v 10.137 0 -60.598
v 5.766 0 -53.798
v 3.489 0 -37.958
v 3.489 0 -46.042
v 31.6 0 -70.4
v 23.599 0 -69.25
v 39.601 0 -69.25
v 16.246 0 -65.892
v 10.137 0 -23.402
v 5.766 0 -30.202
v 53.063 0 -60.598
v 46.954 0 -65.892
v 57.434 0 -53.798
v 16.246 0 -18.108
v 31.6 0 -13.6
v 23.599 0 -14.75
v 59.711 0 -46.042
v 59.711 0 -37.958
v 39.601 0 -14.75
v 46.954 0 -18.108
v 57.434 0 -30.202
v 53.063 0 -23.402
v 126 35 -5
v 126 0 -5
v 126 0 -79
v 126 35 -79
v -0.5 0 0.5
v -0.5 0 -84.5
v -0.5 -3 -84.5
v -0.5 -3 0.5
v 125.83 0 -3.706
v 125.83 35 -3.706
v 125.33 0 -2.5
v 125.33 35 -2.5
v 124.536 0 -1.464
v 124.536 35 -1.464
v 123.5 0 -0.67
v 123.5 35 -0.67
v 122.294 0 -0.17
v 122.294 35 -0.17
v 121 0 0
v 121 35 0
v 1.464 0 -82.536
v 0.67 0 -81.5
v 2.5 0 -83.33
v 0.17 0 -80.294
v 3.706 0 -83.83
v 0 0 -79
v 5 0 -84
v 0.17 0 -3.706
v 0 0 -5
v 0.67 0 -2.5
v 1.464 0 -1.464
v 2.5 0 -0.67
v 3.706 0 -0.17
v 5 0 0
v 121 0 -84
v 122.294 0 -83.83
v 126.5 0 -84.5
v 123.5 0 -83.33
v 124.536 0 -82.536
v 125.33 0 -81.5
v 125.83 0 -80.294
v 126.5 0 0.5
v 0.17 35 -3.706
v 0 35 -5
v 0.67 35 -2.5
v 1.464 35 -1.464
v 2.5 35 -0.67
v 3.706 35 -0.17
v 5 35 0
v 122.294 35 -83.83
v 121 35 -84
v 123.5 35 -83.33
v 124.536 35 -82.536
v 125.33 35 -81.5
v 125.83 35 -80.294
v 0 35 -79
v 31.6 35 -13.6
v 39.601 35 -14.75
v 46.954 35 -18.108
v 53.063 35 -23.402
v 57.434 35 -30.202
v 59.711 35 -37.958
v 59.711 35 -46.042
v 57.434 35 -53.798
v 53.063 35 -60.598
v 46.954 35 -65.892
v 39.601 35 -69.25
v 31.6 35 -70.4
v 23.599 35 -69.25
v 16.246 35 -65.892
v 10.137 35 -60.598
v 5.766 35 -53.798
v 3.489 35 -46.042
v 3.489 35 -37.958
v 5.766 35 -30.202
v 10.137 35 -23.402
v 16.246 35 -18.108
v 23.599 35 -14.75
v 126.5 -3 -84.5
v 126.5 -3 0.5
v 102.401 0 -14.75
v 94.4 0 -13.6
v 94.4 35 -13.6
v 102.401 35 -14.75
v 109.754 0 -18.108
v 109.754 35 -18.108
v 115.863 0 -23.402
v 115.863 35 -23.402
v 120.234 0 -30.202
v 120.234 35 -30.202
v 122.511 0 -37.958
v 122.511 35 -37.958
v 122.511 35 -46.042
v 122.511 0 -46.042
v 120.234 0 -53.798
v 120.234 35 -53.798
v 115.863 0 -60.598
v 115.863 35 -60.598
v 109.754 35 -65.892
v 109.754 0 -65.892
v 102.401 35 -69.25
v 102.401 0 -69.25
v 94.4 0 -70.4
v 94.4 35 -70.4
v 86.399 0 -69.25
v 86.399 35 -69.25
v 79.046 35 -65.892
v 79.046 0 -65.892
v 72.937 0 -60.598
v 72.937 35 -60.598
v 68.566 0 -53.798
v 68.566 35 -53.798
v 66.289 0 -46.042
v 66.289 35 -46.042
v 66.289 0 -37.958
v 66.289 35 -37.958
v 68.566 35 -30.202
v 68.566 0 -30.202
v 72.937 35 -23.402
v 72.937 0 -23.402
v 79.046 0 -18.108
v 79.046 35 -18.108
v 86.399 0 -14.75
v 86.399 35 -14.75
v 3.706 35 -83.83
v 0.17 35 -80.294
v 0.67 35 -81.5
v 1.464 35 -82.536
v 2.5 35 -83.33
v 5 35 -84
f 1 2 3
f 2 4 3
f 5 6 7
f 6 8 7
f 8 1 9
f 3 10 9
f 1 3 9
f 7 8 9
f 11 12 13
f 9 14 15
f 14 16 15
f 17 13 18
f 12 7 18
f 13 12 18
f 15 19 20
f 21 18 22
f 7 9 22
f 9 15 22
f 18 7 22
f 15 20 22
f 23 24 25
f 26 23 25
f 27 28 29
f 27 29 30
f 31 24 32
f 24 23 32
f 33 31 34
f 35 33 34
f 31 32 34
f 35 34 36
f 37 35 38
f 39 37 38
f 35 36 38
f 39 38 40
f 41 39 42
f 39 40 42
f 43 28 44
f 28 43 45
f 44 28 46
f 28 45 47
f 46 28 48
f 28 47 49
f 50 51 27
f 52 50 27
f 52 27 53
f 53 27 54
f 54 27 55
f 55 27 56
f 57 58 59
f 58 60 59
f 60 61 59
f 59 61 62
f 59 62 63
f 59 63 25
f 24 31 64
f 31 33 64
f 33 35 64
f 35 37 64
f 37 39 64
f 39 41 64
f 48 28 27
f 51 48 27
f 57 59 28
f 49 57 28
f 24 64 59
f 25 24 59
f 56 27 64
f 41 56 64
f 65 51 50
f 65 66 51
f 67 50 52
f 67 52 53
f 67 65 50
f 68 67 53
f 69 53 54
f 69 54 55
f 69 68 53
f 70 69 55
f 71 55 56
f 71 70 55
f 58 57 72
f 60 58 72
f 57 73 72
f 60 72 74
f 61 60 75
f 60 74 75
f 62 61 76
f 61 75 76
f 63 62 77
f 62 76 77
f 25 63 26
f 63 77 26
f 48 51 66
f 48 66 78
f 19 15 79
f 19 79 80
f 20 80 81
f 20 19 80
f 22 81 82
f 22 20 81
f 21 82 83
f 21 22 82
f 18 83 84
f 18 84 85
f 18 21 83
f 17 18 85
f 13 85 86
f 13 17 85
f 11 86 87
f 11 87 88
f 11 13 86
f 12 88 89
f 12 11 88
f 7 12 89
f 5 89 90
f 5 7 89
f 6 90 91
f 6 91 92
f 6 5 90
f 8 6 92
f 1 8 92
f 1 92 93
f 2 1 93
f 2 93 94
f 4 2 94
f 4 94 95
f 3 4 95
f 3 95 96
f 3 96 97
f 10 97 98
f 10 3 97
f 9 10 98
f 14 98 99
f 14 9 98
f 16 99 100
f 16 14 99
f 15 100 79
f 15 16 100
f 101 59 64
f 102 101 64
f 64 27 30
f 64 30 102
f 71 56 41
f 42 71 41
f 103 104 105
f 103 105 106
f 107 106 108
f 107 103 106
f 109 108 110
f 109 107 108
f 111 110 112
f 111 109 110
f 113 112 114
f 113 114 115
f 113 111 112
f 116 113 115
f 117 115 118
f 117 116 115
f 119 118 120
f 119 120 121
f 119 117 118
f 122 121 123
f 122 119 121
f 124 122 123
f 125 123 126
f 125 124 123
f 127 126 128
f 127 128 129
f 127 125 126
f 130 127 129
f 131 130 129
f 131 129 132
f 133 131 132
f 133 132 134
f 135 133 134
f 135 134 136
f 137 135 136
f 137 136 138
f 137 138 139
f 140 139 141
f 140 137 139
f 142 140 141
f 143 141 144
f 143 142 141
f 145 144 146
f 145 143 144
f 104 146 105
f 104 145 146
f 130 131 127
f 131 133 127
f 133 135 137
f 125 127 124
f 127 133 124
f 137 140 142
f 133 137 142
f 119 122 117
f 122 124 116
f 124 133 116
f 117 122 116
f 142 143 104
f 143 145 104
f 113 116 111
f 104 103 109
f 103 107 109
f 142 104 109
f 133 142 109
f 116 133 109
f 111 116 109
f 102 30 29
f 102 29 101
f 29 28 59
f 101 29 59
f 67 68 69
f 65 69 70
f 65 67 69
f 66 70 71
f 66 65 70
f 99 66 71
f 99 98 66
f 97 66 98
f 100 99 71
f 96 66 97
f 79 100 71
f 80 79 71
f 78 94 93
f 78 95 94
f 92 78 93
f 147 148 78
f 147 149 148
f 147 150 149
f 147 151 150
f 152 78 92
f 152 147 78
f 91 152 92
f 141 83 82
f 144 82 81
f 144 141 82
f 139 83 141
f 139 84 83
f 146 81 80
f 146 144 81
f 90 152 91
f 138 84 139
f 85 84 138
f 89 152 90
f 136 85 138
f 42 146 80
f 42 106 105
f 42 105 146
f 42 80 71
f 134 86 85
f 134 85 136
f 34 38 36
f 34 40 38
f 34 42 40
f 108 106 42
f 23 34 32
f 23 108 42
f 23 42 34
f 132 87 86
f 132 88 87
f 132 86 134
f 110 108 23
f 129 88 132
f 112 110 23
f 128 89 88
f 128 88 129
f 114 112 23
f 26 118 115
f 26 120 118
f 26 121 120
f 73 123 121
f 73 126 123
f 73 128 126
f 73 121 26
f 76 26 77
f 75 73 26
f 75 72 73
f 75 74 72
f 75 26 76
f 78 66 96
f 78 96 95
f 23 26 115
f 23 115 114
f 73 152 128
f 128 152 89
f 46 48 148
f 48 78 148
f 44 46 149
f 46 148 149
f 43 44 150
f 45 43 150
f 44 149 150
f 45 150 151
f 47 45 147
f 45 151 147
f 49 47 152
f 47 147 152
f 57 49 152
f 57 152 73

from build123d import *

# Parameters (mm, degrees)
SKETCH2_W           = 126
SKETCH2_H           = 84
SKETCH2_R           = 28.4
BOSS_EXTRUDE1_DEPTH = 35
SKETCH3_W           = 127
SKETCH3_H           = 85
BOSS_EXTRUDE2_DEPTH = 3
FILLET1_R           = 5


with BuildPart() as part:
    # Sketch2 → Boss-Extrude1 (new body)
    with BuildSketch(Plane(origin=(0, 0, 0), x_dir=(1, 0, 0), z_dir=(0, 1, 0))):
        with Locations((63, 42)):
            Rectangle(SKETCH2_W, SKETCH2_H)
        with Locations(Location((31.6, 42, 0), (0, 0, 270))):
            Circle(SKETCH2_R, mode=Mode.SUBTRACT)
        with Locations(Location((94.4, 42, 0), (0, 0, 270))):
            Circle(SKETCH2_R, mode=Mode.SUBTRACT)
    extrude(amount=BOSS_EXTRUDE1_DEPTH)

    # Sketch3 → Boss-Extrude2 (add)
    with BuildSketch(Plane.XZ):
        with Locations((63, -42)):
            Rectangle(SKETCH3_W, SKETCH3_H)
    extrude(amount=BOSS_EXTRUDE2_DEPTH)

    # Fillet1
    fillet1_edges = [part.edges().sort_by_distance(p)[0] for p in [
        (0, 17.5, -84),
        (126, 17.5, -84),
        (126, 17.5, 0),
        (0, 17.5, 0),
    ]]
    fillet(fillet1_edges, radius=FILLET1_R)


solid = part.part
